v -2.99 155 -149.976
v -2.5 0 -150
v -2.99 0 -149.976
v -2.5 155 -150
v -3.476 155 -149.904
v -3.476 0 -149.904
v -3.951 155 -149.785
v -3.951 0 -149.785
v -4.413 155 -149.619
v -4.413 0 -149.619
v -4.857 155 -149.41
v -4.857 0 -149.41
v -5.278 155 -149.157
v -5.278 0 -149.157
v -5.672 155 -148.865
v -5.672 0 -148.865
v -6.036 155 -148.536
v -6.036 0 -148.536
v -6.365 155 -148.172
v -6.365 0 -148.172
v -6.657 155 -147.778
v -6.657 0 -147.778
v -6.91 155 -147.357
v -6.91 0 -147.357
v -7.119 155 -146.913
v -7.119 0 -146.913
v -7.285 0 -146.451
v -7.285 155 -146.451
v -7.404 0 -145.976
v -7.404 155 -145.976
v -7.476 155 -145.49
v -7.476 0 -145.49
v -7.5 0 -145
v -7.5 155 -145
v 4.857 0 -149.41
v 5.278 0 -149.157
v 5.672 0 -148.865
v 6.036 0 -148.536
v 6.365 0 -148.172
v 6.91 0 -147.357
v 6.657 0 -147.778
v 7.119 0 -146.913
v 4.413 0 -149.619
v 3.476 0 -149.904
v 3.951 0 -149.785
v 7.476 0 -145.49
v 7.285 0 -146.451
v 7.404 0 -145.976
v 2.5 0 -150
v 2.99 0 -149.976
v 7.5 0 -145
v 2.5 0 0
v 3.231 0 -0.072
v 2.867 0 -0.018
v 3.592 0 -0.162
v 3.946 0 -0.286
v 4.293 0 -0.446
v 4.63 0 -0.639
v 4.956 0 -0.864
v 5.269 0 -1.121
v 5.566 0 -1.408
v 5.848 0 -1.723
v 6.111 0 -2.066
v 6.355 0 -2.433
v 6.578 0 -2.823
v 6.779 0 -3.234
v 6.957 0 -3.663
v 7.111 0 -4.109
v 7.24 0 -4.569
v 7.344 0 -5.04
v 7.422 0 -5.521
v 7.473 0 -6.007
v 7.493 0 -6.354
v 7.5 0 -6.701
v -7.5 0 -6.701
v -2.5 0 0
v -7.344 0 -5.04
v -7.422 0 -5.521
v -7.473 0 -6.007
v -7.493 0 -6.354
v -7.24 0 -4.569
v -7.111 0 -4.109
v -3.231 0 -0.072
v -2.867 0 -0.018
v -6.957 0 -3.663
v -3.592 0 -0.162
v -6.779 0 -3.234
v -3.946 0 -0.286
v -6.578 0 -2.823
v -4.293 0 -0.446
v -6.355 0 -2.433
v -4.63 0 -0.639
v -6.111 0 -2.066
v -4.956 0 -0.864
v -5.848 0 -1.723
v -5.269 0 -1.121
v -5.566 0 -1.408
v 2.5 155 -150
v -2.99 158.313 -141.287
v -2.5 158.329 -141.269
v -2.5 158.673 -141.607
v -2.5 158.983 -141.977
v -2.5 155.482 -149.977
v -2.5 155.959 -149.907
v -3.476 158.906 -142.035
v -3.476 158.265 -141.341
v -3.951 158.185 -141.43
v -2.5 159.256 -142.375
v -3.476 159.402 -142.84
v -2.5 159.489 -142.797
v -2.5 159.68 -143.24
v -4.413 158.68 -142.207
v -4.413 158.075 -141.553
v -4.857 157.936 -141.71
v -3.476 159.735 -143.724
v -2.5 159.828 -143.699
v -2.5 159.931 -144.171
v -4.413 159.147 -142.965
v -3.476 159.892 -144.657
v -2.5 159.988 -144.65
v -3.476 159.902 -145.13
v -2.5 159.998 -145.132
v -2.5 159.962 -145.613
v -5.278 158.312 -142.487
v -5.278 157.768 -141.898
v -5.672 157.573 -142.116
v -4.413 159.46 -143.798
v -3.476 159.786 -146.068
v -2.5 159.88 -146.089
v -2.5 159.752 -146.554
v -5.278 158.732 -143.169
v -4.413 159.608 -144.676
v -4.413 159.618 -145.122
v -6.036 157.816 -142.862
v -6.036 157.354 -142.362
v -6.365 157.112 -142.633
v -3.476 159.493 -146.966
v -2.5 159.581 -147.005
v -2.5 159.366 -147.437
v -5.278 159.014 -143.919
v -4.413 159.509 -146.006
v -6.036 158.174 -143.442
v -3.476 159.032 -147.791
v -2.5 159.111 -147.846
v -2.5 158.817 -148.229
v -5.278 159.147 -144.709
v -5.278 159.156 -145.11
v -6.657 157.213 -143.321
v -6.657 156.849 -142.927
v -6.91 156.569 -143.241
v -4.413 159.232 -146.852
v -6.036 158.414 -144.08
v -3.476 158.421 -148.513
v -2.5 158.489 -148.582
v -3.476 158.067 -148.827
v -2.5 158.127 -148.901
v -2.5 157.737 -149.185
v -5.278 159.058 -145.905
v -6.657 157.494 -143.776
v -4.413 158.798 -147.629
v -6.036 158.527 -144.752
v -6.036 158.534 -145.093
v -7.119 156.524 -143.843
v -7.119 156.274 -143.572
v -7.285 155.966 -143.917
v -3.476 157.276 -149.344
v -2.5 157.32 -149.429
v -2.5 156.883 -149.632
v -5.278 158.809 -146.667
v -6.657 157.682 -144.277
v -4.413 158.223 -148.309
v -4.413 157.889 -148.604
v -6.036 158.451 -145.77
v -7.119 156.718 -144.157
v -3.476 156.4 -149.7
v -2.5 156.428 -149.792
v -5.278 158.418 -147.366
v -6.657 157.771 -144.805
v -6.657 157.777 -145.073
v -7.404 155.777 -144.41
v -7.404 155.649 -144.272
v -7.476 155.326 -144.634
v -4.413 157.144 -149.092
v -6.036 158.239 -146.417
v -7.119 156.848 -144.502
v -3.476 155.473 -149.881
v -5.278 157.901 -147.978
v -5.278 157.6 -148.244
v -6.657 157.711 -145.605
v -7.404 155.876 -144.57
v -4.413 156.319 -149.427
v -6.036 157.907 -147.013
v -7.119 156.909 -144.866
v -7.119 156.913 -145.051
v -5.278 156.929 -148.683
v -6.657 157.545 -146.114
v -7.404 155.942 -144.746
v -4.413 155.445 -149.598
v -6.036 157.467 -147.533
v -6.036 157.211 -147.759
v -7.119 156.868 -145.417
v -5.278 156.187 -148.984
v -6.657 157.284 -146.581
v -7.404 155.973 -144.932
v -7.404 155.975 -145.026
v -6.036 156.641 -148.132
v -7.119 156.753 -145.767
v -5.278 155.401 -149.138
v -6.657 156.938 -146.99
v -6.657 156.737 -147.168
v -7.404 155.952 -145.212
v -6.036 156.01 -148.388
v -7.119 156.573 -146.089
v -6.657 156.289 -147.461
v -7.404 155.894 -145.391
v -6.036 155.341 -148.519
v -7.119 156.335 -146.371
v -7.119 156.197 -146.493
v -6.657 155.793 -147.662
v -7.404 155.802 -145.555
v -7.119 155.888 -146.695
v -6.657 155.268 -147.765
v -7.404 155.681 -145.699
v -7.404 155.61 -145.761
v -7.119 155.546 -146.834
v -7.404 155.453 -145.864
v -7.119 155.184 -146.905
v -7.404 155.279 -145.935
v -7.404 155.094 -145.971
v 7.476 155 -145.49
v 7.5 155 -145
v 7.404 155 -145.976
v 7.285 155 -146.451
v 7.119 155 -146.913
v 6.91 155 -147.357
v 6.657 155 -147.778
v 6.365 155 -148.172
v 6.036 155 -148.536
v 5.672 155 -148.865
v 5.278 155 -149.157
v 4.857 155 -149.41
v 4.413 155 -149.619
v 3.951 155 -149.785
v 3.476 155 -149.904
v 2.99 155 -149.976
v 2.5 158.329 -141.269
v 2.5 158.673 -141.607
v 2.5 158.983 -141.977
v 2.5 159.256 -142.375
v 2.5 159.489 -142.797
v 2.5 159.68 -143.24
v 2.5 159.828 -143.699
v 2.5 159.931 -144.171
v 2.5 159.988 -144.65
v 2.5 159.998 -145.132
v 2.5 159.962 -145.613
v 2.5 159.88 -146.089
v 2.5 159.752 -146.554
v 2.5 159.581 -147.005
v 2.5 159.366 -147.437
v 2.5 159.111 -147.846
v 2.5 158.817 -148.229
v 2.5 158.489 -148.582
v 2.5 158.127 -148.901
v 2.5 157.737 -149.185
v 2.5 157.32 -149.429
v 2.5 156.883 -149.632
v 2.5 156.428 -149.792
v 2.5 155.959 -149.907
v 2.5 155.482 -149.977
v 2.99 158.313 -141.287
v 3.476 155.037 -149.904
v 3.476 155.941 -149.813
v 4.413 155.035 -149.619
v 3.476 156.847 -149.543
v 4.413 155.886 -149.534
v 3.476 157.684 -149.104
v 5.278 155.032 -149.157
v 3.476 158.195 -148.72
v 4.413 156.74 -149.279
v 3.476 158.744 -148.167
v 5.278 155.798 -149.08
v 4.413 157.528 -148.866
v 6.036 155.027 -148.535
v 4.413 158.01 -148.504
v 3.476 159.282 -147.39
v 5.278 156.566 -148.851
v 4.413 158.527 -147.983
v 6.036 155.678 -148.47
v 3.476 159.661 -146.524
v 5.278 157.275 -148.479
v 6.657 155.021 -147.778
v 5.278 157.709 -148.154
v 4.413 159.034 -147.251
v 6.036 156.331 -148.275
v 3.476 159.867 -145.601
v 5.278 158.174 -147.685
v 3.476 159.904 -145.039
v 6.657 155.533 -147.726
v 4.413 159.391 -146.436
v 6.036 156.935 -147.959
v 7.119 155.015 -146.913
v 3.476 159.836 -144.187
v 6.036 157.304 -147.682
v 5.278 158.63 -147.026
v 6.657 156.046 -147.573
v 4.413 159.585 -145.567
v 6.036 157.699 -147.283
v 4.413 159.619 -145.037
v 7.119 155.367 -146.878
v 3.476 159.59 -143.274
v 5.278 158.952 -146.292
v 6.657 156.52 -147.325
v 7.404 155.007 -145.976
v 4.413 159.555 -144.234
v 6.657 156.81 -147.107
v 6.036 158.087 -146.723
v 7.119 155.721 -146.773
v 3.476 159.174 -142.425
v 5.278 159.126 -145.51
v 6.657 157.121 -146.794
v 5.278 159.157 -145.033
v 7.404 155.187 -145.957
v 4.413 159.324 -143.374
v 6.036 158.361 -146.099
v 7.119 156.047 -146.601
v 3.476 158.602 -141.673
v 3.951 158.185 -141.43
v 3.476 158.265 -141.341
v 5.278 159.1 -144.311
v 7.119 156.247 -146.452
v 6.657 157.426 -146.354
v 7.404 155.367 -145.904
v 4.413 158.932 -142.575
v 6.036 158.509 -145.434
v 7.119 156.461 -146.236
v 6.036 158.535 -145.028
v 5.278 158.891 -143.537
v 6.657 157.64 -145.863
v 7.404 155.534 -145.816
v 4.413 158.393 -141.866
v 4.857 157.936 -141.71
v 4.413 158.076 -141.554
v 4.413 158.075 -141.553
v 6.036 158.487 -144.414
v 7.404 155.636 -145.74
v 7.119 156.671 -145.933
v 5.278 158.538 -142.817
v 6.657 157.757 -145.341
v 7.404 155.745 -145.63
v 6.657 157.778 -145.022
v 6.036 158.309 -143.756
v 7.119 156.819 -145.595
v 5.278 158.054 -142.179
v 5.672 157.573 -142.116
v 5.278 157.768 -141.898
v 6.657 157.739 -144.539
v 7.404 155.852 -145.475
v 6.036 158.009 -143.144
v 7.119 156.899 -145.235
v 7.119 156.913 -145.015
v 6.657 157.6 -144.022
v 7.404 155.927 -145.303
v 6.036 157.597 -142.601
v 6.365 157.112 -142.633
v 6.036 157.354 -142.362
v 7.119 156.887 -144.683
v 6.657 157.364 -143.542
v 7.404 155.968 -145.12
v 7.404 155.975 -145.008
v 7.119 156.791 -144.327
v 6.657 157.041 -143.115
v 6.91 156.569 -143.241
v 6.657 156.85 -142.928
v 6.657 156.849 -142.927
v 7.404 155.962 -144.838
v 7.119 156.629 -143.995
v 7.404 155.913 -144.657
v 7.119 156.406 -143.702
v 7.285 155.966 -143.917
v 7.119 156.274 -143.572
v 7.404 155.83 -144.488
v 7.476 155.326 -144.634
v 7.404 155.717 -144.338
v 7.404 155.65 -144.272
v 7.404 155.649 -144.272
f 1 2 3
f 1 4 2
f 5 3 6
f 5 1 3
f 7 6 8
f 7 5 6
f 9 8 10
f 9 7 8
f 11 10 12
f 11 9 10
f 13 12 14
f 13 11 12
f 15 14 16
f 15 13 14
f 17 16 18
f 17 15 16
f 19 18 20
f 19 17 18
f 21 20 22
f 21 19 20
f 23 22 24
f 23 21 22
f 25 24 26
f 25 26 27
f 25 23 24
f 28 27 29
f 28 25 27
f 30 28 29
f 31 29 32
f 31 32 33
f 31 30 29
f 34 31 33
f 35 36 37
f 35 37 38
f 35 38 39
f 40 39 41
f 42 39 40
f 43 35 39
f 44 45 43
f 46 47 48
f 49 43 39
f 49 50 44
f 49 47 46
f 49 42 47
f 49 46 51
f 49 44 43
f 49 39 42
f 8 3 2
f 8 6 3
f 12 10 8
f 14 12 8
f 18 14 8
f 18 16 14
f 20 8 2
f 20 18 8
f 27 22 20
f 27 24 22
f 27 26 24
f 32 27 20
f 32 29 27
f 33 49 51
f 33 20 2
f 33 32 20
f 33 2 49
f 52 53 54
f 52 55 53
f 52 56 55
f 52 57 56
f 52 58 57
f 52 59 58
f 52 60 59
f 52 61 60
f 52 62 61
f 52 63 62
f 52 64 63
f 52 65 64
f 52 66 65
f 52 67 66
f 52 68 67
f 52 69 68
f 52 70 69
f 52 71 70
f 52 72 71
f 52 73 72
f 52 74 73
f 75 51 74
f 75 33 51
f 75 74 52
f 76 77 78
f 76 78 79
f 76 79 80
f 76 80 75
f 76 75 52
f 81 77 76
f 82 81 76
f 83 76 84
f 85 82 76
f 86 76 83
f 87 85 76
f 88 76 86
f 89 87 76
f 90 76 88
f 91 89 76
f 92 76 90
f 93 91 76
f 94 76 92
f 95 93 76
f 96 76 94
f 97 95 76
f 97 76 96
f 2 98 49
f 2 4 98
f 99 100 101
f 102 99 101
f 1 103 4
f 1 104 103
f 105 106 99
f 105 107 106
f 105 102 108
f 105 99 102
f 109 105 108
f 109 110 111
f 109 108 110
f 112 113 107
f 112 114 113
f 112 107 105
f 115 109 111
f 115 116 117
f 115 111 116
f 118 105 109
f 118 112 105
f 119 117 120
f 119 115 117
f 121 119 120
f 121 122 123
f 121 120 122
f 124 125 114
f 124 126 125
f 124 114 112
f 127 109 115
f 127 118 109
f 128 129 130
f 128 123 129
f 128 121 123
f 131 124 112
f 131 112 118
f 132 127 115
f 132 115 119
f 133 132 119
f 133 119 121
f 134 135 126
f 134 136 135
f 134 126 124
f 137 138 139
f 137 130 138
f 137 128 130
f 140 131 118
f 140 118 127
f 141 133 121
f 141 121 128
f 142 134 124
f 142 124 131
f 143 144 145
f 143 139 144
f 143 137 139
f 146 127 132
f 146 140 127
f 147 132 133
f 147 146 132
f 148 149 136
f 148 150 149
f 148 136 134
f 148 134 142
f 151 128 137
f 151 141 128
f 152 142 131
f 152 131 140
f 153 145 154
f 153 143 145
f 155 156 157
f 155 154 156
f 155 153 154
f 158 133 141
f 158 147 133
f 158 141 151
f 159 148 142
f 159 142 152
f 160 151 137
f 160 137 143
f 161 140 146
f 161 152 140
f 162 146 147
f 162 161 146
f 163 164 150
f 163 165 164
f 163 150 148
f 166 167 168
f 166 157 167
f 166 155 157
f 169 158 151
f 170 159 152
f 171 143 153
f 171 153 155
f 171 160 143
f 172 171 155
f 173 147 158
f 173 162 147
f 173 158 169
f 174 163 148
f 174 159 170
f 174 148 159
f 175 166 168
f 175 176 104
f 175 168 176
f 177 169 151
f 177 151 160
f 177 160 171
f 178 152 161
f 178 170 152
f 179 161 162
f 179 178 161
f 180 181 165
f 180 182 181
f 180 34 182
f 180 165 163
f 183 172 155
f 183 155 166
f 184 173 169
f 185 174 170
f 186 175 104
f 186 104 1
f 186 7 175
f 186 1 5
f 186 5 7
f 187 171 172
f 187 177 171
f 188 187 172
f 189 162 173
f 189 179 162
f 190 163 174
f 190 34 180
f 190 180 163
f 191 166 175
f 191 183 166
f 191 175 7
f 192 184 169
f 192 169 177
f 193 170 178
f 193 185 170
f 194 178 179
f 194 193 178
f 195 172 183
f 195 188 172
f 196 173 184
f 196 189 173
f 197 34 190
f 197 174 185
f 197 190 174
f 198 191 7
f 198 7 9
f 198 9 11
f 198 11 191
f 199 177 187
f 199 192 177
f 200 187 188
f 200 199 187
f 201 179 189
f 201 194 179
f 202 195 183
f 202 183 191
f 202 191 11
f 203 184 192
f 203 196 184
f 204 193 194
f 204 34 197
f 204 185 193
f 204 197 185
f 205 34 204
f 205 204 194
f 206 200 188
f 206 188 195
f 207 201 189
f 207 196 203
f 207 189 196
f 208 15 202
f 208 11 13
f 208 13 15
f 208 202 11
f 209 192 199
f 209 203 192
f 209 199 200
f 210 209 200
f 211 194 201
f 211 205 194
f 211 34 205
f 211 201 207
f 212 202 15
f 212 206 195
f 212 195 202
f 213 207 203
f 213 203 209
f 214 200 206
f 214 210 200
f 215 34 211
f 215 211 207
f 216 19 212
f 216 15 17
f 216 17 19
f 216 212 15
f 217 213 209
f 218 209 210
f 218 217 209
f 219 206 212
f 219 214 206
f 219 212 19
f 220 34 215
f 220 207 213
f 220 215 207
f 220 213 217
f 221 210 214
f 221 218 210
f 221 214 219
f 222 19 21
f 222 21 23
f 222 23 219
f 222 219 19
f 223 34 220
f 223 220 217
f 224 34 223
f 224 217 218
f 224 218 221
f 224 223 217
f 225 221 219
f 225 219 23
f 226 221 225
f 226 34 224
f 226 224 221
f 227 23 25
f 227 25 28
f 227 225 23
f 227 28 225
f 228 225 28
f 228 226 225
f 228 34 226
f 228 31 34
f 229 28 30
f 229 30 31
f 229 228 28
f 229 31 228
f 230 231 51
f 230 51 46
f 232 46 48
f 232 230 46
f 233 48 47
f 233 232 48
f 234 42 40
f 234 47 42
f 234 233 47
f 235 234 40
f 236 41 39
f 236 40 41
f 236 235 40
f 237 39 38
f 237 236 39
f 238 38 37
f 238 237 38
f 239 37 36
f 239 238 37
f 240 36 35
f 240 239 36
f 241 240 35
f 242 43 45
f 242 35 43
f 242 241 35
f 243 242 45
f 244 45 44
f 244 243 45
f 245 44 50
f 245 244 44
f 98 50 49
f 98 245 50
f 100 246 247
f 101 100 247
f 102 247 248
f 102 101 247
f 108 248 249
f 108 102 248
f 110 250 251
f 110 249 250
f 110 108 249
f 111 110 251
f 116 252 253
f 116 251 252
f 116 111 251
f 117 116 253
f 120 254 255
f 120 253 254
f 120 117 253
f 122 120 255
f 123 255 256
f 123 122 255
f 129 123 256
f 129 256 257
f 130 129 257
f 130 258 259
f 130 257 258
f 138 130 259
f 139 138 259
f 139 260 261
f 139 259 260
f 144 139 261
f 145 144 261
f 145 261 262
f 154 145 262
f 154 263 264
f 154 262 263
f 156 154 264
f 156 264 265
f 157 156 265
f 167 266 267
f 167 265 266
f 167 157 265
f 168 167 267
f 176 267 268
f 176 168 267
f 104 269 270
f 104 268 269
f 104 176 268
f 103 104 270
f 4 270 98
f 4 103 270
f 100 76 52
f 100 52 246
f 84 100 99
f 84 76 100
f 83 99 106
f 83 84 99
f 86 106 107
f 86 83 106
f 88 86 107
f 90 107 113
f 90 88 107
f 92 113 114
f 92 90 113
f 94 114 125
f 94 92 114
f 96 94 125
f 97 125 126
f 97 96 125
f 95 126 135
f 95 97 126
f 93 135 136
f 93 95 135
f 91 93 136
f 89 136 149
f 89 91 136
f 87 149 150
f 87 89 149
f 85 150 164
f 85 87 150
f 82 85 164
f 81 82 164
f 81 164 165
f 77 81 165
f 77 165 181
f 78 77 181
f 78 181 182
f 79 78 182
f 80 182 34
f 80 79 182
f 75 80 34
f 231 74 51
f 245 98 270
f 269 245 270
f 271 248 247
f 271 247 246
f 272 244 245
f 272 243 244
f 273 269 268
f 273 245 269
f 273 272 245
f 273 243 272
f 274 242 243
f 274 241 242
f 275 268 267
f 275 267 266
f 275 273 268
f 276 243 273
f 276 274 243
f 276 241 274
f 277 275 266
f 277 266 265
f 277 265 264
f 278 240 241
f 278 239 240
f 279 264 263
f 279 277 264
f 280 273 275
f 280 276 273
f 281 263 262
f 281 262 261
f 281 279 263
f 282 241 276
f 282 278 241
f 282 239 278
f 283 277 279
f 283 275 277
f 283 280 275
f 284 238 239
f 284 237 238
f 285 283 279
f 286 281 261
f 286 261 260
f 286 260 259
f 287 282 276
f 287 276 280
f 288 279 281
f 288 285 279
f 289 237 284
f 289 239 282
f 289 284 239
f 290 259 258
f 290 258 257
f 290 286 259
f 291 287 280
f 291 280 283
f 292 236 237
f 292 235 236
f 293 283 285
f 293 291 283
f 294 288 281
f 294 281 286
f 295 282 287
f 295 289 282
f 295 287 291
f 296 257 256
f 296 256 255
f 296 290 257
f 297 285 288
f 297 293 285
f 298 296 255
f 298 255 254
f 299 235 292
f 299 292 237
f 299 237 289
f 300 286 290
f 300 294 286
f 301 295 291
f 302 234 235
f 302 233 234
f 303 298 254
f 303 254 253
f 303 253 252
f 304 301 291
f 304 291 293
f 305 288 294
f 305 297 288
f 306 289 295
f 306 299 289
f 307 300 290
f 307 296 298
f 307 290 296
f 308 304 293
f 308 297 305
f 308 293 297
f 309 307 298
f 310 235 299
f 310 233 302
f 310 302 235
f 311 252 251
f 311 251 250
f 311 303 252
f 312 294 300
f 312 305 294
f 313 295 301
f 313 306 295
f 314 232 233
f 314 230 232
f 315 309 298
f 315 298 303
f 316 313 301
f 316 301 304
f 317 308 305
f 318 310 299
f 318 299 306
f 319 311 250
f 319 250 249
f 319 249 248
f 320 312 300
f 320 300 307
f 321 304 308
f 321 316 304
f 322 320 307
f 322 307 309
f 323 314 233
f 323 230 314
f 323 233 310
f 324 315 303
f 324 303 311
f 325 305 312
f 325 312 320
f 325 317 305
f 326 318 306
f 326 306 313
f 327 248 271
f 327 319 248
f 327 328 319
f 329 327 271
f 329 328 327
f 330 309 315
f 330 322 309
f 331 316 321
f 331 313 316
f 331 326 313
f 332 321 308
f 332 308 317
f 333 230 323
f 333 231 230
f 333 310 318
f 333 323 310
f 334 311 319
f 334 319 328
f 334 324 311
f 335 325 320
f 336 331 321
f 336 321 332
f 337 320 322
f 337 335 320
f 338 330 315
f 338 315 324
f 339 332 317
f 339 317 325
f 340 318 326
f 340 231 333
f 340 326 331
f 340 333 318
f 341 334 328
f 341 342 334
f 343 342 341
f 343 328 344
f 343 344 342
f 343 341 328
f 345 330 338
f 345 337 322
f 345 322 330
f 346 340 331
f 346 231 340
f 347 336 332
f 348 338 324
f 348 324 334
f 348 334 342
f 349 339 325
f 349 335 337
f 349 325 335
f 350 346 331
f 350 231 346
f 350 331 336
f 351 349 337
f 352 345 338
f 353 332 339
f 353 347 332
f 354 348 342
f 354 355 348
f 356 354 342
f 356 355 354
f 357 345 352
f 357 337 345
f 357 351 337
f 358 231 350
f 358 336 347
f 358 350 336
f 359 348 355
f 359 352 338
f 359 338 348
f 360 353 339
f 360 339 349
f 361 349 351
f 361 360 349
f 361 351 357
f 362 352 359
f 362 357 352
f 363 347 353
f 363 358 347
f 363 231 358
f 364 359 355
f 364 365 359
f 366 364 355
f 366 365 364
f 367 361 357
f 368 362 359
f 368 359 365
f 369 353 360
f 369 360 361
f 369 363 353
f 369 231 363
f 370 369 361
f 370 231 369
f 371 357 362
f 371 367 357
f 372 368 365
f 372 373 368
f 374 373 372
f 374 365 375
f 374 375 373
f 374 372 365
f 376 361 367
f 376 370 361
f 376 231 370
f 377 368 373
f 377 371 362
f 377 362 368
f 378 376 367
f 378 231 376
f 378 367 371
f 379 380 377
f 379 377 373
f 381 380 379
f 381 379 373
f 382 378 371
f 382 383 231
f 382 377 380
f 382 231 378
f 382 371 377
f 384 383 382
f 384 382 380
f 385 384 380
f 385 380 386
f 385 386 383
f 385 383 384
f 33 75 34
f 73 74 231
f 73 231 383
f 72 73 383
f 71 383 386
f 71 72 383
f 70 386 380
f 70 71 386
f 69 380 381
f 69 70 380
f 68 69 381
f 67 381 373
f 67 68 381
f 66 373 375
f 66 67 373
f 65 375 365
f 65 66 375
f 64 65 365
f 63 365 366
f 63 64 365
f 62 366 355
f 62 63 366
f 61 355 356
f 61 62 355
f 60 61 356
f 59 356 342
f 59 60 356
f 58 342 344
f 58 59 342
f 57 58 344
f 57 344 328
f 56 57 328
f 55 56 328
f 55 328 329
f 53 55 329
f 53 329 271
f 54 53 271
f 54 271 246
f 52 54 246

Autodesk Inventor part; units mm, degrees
ref_plane "YZ Plane" through (0, 0, 0) normal (1, 0, 0) x (0, 1, 0)
ref_plane "XZ Plane" through (0, 0, 0) normal (0, 1, 0) x (-1, 0, 0)
ref_plane "XY Plane" through (0, 0, 0) normal (0, 0, 1) x (1, 0, 0)
sketch "Sketch1" plane through (0, 0, 0) normal (1, 0, 0) x (0, 1, 0)
  line L0 (0, 0) -> (158.3288, -141.2692)
  line L1 (155, -150) -> (0, -150)
  line L2 (0, -150) -> (0, 0)
  arc A0 (155, -150) -> (158.3288, -141.2692) centre (155, -145) ccw
  point P0 (168.114, -150)
  dimension "d1" = 150
  dimension "d2" = 5
  dimension "d3" = 155
extrude "Extrusion1" add sketch "Sketch1" along normal mid plane 15
fillet "Fillet1" radius 5 6 edges at (7.5, 159.6719, -146.7813) (7.5, 77.5, -150) (7.5, 79.1644, -70.6346) (-7.5, 159.6719, -146.7813) (-7.5, 77.5, -150) (-7.5, 79.1644, -70.6346)
properties part number "Wing_vertical"
